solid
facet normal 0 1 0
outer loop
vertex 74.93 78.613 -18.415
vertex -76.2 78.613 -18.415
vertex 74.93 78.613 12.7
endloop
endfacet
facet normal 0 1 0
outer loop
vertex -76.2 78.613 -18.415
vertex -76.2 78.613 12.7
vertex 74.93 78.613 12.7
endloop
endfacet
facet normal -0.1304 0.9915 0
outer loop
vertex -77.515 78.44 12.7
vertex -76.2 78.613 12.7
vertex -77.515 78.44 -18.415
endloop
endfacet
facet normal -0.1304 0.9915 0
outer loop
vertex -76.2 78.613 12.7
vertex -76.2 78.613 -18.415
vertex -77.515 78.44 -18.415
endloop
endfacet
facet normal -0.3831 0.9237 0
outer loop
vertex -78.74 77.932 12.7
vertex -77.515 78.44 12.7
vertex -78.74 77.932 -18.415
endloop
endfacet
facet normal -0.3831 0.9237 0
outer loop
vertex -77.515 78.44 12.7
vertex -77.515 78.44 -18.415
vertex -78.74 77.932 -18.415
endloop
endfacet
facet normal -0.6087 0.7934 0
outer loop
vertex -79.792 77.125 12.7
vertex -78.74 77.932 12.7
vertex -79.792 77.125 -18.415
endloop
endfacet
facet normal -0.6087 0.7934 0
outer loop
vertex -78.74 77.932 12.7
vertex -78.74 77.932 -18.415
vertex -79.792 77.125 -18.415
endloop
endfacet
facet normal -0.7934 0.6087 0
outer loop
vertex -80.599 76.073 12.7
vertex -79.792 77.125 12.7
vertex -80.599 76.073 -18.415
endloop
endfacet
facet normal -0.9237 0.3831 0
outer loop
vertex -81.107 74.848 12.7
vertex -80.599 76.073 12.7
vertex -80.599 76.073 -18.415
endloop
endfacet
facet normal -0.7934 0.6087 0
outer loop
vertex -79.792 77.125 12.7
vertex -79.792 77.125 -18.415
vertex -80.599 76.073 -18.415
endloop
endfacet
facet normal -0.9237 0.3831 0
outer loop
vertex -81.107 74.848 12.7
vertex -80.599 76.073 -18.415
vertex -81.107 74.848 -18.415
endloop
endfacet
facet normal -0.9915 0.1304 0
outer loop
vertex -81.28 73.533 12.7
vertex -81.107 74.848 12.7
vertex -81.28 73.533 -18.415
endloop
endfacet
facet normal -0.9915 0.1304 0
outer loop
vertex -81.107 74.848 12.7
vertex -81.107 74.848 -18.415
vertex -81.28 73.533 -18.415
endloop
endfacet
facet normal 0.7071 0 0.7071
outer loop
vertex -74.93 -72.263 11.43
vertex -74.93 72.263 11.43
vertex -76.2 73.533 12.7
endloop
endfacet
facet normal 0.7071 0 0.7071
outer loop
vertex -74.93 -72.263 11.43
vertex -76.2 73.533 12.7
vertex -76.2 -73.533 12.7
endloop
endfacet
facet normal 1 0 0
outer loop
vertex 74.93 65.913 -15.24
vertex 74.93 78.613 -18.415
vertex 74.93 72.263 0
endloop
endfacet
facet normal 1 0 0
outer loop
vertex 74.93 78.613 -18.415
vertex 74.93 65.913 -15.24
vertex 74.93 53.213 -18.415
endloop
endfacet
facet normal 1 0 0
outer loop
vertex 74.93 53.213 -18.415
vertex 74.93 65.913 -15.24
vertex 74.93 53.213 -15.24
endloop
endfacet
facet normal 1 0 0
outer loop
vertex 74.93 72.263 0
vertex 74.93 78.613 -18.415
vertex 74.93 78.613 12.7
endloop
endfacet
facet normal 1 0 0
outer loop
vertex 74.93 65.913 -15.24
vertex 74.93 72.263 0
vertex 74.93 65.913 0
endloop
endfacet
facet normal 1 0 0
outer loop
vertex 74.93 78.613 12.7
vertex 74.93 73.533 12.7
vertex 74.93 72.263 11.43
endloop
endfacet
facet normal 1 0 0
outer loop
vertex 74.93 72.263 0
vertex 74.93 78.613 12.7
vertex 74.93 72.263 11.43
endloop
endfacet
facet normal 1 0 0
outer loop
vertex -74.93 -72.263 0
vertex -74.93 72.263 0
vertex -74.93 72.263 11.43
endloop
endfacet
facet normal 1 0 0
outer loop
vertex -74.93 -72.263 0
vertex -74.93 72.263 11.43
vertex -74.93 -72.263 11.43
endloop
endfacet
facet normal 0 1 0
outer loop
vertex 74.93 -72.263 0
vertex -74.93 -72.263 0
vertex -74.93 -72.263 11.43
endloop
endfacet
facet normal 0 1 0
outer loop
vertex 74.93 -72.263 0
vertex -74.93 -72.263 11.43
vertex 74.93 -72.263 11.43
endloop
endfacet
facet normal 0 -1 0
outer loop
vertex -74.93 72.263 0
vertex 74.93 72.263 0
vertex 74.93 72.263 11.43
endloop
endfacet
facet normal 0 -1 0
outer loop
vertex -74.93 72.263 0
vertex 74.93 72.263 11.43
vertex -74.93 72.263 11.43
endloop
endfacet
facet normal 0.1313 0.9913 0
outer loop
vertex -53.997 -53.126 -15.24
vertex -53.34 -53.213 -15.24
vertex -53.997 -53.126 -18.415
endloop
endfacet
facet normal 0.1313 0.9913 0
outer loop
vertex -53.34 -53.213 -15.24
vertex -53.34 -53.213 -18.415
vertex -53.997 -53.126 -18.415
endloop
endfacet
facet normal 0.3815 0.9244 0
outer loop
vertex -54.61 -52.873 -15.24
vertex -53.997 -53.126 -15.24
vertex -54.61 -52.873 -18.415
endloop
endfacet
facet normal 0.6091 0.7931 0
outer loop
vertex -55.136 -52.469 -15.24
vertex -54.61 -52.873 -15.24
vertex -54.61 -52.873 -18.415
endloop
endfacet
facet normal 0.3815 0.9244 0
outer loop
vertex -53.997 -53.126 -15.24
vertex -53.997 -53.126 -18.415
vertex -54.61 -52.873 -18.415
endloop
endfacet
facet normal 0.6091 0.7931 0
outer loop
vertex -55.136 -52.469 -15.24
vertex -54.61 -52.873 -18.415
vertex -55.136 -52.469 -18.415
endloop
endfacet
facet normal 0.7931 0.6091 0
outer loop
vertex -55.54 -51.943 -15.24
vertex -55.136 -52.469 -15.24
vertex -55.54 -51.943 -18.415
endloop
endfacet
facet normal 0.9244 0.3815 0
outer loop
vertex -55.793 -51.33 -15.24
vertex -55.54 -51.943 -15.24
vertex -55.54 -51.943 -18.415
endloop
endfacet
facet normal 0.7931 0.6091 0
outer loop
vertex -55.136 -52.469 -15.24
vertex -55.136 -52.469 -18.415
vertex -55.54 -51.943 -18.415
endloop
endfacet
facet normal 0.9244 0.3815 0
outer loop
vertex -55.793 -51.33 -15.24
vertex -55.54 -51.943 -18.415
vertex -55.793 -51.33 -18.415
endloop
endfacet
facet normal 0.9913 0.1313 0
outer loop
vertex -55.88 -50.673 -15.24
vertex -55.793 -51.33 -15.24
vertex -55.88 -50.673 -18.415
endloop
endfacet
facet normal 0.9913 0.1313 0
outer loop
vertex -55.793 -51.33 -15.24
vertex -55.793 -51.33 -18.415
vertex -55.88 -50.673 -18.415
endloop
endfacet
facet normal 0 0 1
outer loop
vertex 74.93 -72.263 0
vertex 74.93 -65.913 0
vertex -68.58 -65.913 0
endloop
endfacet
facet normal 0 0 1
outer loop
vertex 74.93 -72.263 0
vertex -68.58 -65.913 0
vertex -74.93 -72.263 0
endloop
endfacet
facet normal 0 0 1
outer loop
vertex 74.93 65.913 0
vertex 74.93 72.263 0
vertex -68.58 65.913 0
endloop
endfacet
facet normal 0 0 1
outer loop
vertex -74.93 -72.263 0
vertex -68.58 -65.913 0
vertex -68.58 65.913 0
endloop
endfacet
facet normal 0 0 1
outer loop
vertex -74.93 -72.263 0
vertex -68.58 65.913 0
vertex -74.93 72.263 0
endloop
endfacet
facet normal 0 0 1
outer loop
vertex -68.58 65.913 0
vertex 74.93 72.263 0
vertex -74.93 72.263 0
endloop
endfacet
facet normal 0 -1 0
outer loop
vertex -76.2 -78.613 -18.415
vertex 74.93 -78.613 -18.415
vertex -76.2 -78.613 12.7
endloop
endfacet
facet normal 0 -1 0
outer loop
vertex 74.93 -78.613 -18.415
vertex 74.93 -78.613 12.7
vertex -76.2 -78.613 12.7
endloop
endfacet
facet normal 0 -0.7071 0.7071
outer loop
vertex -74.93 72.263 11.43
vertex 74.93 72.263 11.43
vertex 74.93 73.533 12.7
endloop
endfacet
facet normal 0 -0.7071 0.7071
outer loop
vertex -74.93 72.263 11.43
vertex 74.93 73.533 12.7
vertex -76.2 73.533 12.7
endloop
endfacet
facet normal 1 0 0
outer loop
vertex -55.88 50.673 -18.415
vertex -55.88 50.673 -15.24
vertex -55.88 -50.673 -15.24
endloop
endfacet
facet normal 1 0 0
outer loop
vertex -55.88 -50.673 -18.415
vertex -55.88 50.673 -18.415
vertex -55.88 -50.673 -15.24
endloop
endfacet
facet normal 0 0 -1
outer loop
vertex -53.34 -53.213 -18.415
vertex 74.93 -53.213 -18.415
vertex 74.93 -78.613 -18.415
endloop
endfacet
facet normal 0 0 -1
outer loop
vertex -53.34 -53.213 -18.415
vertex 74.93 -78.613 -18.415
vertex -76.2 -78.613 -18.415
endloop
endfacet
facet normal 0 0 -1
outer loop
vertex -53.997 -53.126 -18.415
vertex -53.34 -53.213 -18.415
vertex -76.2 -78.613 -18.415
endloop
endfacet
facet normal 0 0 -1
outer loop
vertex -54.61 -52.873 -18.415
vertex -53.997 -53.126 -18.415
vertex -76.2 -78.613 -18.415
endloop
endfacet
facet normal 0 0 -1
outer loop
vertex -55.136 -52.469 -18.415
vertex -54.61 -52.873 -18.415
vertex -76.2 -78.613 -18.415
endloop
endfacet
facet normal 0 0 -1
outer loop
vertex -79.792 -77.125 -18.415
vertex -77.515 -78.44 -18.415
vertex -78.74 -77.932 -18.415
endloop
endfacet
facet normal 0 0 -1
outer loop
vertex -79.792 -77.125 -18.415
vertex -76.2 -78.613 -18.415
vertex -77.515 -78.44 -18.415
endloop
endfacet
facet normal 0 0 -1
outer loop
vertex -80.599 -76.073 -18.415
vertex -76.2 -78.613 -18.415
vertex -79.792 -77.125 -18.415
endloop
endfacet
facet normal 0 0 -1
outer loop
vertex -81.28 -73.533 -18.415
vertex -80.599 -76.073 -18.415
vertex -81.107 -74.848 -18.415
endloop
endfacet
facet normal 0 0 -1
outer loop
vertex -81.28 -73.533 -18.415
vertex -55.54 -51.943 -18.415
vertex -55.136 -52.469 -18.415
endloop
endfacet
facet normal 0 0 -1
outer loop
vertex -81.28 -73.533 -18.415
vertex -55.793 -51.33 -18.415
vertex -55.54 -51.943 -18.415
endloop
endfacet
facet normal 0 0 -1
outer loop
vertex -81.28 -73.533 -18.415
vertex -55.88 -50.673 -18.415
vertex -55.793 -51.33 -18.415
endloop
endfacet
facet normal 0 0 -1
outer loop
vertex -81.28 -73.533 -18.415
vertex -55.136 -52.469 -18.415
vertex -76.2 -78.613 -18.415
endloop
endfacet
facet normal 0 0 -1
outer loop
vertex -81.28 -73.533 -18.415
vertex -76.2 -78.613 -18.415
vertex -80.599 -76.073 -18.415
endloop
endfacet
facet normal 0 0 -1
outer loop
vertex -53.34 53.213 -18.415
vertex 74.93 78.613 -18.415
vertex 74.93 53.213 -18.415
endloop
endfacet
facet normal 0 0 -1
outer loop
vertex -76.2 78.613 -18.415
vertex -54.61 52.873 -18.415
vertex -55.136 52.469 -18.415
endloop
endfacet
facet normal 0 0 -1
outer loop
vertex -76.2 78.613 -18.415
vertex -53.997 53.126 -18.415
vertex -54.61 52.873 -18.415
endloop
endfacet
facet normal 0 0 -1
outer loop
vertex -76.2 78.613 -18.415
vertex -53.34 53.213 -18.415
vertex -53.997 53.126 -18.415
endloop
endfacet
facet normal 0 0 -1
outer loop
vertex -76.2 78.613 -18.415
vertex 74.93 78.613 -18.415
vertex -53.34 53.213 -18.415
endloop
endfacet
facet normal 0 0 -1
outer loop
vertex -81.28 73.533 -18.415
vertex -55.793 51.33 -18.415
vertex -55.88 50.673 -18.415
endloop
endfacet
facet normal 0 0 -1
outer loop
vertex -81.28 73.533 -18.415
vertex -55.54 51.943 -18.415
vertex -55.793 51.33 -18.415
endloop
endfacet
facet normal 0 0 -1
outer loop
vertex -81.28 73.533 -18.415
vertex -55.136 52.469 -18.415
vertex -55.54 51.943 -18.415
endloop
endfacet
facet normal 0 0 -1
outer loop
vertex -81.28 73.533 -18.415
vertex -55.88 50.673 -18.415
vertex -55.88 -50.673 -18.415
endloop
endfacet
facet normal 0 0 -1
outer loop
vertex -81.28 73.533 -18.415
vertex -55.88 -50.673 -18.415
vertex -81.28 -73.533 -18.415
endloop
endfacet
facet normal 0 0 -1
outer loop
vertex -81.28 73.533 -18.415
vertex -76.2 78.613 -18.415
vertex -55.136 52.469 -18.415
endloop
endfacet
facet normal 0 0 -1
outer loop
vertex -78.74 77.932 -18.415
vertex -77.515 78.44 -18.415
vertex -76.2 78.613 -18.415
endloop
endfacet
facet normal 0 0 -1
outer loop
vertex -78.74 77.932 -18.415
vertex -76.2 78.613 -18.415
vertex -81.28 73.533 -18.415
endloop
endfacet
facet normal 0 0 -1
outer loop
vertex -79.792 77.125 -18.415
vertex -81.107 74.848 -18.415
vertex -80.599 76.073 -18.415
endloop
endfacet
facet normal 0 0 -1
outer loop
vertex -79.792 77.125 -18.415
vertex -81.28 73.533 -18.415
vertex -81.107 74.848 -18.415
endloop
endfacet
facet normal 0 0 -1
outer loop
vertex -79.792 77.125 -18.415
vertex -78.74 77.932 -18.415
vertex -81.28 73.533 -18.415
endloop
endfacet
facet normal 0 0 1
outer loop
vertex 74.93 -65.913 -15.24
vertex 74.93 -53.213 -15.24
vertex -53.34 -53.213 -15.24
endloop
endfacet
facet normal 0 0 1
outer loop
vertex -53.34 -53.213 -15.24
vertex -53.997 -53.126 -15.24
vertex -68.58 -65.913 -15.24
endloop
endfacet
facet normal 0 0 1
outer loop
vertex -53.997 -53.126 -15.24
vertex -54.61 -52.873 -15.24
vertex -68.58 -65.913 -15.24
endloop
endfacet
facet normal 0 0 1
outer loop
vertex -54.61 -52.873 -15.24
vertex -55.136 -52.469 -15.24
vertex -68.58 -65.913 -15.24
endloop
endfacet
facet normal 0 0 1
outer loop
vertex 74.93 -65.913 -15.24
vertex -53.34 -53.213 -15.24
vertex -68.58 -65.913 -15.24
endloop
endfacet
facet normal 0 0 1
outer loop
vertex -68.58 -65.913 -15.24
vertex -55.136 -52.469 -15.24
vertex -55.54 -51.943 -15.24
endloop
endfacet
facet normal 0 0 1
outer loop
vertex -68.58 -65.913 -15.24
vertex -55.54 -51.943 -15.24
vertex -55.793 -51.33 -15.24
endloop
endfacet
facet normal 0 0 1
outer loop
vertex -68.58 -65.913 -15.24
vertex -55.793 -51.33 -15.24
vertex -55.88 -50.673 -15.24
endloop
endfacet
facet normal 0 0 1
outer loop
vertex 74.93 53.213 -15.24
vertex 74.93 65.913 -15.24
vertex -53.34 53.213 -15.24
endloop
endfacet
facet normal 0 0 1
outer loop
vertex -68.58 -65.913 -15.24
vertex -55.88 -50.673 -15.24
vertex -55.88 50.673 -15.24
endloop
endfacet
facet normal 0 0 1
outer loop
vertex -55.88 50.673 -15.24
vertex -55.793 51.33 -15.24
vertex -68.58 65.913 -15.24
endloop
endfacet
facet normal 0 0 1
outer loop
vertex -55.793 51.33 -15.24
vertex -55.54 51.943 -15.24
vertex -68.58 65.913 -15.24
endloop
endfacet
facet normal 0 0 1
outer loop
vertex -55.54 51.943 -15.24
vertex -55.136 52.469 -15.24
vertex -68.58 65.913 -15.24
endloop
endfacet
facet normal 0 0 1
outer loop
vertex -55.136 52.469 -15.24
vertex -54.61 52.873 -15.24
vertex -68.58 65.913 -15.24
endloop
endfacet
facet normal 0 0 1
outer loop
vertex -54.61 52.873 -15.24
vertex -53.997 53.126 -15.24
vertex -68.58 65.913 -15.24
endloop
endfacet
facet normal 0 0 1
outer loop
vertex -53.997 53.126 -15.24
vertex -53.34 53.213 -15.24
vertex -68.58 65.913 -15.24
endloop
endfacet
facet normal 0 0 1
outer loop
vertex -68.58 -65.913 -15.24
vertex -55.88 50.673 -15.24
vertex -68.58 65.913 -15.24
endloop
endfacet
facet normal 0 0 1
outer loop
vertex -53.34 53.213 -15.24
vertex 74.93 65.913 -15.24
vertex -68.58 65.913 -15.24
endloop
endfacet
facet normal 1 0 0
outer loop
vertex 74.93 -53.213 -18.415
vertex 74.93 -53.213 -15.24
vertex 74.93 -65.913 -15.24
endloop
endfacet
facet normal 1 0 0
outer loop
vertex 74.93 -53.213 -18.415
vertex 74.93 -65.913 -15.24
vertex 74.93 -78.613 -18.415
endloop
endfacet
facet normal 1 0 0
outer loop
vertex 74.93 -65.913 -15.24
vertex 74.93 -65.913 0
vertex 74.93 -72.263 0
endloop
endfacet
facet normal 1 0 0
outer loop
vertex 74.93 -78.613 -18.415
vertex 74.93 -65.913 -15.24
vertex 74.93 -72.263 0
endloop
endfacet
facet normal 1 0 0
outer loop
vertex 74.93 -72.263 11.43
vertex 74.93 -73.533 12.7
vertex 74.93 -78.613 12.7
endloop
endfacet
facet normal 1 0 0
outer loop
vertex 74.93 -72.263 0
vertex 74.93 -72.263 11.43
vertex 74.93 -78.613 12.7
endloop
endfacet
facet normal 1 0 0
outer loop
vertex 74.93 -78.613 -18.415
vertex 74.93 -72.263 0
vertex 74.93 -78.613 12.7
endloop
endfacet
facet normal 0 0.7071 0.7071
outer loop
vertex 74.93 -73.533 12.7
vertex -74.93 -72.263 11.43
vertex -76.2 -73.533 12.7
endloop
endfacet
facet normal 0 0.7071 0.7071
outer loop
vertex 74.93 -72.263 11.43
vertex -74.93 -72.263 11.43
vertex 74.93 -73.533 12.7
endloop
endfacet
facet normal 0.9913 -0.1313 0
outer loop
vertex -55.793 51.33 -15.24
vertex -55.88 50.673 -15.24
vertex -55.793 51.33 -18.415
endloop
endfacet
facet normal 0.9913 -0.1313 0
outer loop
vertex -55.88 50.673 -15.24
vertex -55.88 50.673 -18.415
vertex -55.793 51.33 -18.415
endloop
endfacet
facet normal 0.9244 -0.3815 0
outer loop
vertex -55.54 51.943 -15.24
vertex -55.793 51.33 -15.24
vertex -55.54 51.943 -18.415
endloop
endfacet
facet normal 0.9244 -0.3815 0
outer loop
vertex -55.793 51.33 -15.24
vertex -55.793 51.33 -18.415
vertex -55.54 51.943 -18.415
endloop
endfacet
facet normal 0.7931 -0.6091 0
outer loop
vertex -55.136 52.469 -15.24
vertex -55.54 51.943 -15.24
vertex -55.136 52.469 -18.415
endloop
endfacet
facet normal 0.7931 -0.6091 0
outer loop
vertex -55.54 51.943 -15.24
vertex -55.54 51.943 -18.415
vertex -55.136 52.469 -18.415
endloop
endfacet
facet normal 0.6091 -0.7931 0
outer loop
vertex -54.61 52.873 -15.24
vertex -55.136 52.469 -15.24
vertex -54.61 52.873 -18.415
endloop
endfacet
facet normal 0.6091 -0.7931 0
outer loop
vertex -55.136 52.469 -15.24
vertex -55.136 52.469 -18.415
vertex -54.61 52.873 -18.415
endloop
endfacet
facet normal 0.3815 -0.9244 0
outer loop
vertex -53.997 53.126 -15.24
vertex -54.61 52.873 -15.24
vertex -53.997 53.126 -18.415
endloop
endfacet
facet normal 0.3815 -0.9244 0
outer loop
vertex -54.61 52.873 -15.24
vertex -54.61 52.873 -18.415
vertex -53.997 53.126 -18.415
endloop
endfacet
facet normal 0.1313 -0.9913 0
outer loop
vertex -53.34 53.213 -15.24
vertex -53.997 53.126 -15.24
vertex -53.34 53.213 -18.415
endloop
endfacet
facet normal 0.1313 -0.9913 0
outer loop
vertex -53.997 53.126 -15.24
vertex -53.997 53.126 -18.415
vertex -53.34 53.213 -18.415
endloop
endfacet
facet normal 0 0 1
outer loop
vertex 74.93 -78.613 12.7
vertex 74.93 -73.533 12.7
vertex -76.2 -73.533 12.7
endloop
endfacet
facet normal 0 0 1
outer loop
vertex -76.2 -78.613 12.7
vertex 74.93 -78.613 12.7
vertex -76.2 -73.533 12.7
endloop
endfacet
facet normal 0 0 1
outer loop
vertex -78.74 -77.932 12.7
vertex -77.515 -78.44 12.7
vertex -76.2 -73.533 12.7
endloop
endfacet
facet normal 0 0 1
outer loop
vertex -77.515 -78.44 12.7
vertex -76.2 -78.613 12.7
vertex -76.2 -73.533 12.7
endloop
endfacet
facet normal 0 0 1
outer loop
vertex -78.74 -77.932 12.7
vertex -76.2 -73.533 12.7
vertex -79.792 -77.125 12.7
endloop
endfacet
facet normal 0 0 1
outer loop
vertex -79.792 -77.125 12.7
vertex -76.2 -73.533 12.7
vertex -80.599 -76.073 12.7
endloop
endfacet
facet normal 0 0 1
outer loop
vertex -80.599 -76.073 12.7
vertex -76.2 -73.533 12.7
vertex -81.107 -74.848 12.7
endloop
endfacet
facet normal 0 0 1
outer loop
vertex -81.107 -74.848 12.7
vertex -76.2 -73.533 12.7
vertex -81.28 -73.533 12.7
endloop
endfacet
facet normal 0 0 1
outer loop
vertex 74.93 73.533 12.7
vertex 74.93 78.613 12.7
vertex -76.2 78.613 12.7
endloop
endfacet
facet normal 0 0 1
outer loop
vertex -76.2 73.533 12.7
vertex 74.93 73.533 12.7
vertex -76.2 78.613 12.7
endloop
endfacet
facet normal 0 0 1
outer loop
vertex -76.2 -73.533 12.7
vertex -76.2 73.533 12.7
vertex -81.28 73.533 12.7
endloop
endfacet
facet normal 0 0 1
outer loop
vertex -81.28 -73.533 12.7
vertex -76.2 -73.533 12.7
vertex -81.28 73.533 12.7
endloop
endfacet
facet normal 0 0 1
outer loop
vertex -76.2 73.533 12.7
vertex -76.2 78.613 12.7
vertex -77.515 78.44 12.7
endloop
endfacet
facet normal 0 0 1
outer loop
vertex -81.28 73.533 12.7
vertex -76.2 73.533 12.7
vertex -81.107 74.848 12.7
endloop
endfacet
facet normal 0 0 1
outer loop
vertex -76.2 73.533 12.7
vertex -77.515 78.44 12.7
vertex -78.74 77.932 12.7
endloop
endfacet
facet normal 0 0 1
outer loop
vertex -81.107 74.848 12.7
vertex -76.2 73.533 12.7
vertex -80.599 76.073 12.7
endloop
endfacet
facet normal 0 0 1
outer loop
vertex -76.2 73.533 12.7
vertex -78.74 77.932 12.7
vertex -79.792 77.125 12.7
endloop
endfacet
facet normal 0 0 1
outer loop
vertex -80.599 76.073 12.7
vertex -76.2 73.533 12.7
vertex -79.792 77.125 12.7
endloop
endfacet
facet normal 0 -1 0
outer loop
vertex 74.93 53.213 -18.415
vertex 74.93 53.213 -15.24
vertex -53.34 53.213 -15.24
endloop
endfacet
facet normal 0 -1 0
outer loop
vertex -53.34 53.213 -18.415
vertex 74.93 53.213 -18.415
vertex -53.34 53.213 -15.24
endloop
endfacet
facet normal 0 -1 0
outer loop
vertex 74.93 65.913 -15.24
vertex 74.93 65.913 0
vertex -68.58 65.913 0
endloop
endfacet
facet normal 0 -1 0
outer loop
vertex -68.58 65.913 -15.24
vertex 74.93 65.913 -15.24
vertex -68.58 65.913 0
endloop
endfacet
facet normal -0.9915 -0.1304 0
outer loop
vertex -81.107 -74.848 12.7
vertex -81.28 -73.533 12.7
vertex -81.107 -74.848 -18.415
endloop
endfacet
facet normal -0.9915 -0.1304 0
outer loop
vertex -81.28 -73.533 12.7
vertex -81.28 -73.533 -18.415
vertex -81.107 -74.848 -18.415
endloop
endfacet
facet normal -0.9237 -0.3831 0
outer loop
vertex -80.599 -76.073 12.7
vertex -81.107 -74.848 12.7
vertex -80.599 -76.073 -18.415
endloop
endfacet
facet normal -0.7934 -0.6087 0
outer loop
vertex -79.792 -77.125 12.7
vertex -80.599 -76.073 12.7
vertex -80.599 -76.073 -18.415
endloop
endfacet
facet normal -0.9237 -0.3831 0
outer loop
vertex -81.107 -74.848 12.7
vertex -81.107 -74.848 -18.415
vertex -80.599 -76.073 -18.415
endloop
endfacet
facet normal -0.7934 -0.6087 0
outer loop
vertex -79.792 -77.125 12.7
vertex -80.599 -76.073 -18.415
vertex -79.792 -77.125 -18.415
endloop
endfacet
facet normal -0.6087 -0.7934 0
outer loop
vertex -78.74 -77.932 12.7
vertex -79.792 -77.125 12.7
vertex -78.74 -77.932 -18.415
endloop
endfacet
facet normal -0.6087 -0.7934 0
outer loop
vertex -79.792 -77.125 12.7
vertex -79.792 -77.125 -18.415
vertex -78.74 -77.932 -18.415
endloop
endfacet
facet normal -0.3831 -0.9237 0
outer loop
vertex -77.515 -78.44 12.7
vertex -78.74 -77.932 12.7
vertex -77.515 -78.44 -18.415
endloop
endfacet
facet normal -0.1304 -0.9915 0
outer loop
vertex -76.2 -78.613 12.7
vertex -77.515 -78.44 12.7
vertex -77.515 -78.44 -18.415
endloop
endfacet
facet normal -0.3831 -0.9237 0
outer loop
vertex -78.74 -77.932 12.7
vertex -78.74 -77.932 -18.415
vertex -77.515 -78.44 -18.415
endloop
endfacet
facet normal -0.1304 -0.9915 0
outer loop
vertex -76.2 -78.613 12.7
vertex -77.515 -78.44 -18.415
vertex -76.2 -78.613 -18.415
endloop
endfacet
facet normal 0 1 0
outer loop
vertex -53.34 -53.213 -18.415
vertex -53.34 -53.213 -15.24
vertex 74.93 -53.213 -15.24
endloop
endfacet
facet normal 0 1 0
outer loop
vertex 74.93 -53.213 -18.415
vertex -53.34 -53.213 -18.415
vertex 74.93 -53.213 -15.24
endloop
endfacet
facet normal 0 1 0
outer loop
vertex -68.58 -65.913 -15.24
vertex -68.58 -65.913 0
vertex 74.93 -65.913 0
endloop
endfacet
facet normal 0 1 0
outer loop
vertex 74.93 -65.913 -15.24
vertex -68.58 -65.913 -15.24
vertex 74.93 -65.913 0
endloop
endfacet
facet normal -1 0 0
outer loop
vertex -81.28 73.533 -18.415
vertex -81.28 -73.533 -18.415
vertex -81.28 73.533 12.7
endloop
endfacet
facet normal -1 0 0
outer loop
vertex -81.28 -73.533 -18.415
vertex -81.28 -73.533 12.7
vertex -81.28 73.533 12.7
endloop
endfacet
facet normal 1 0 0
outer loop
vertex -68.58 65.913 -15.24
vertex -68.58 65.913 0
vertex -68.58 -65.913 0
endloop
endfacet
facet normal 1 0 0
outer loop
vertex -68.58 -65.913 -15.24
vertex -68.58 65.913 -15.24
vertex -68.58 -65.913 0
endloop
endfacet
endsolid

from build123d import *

# Parameters (mm, degrees)
BOSS_EXTRUDE1_DEPTH = 12.7
BOSS_EXTRUDE2_DEPTH = 15.24
BOSS_EXTRUDE3_DEPTH = 3.175
FILLET1_R           = 5.08
FILLET3_R           = 2.54
CHAMFER2_SIZE       = 1.27


with BuildPart() as part:
    # Sketch1 → Boss-Extrude1 (new body)
    with BuildSketch(Plane.XY):
        Polygon((74.93, -72.263), (74.93, -78.613), (-81.28, -78.613), (-81.28, 78.613), (74.93, 78.613), (74.93, 72.263), (-74.93, 72.263), (-74.93, -72.263), align=None)
    extrude(amount=BOSS_EXTRUDE1_DEPTH)

    # Sketch2 → Boss-Extrude2 (add)
    with BuildSketch(Plane(origin=(0, 0, 0), x_dir=(-1, 0, 0), z_dir=(0, 0, -1))):
        Polygon((-74.93, -65.913), (-74.93, -78.613), (81.28, -78.613), (81.28, 78.613), (-74.93, 78.613), (-74.93, 65.913), (68.58, 65.913), (68.58, -65.913), align=None)
    extrude(amount=BOSS_EXTRUDE2_DEPTH)

    # Sketch3 → Boss-Extrude3 (add)
    with BuildSketch(Plane(origin=(0, 0, -15.24), x_dir=(-1, 0, 0), z_dir=(0, 0, -1))):
        Polygon((-74.93, -53.213), (-74.93, -78.613), (81.28, -78.613), (81.28, 78.613), (-74.93, 78.613), (-74.93, 53.213), (55.88, 53.213), (55.88, -53.213), align=None)
    extrude(amount=BOSS_EXTRUDE3_DEPTH)

    # Fillet1
    fillet1_edges = [part.edges().sort_by_distance(p)[0] for p in [
        (-81.28, -78.613, -2.8575),
        (-81.28, 78.613, -2.8575),
    ]]
    fillet(fillet1_edges, radius=FILLET1_R)

    # Fillet3
    fillet3_edges = [part.edges().sort_by_distance(p)[0] for p in [
        (-55.88, 53.213, -16.8275),
        (-55.88, -53.213, -16.8275),
    ]]
    fillet(fillet3_edges, radius=FILLET3_R)

    # Chamfer2
    chamfer2_edges = [part.edges().sort_by_distance(p)[0] for p in [
        (0, -72.263, 12.7),
        (-74.93, 0, 12.7),
        (0, 72.263, 12.7),
    ]]
    chamfer(chamfer2_edges, length=CHAMFER2_SIZE)


solid = part.part
